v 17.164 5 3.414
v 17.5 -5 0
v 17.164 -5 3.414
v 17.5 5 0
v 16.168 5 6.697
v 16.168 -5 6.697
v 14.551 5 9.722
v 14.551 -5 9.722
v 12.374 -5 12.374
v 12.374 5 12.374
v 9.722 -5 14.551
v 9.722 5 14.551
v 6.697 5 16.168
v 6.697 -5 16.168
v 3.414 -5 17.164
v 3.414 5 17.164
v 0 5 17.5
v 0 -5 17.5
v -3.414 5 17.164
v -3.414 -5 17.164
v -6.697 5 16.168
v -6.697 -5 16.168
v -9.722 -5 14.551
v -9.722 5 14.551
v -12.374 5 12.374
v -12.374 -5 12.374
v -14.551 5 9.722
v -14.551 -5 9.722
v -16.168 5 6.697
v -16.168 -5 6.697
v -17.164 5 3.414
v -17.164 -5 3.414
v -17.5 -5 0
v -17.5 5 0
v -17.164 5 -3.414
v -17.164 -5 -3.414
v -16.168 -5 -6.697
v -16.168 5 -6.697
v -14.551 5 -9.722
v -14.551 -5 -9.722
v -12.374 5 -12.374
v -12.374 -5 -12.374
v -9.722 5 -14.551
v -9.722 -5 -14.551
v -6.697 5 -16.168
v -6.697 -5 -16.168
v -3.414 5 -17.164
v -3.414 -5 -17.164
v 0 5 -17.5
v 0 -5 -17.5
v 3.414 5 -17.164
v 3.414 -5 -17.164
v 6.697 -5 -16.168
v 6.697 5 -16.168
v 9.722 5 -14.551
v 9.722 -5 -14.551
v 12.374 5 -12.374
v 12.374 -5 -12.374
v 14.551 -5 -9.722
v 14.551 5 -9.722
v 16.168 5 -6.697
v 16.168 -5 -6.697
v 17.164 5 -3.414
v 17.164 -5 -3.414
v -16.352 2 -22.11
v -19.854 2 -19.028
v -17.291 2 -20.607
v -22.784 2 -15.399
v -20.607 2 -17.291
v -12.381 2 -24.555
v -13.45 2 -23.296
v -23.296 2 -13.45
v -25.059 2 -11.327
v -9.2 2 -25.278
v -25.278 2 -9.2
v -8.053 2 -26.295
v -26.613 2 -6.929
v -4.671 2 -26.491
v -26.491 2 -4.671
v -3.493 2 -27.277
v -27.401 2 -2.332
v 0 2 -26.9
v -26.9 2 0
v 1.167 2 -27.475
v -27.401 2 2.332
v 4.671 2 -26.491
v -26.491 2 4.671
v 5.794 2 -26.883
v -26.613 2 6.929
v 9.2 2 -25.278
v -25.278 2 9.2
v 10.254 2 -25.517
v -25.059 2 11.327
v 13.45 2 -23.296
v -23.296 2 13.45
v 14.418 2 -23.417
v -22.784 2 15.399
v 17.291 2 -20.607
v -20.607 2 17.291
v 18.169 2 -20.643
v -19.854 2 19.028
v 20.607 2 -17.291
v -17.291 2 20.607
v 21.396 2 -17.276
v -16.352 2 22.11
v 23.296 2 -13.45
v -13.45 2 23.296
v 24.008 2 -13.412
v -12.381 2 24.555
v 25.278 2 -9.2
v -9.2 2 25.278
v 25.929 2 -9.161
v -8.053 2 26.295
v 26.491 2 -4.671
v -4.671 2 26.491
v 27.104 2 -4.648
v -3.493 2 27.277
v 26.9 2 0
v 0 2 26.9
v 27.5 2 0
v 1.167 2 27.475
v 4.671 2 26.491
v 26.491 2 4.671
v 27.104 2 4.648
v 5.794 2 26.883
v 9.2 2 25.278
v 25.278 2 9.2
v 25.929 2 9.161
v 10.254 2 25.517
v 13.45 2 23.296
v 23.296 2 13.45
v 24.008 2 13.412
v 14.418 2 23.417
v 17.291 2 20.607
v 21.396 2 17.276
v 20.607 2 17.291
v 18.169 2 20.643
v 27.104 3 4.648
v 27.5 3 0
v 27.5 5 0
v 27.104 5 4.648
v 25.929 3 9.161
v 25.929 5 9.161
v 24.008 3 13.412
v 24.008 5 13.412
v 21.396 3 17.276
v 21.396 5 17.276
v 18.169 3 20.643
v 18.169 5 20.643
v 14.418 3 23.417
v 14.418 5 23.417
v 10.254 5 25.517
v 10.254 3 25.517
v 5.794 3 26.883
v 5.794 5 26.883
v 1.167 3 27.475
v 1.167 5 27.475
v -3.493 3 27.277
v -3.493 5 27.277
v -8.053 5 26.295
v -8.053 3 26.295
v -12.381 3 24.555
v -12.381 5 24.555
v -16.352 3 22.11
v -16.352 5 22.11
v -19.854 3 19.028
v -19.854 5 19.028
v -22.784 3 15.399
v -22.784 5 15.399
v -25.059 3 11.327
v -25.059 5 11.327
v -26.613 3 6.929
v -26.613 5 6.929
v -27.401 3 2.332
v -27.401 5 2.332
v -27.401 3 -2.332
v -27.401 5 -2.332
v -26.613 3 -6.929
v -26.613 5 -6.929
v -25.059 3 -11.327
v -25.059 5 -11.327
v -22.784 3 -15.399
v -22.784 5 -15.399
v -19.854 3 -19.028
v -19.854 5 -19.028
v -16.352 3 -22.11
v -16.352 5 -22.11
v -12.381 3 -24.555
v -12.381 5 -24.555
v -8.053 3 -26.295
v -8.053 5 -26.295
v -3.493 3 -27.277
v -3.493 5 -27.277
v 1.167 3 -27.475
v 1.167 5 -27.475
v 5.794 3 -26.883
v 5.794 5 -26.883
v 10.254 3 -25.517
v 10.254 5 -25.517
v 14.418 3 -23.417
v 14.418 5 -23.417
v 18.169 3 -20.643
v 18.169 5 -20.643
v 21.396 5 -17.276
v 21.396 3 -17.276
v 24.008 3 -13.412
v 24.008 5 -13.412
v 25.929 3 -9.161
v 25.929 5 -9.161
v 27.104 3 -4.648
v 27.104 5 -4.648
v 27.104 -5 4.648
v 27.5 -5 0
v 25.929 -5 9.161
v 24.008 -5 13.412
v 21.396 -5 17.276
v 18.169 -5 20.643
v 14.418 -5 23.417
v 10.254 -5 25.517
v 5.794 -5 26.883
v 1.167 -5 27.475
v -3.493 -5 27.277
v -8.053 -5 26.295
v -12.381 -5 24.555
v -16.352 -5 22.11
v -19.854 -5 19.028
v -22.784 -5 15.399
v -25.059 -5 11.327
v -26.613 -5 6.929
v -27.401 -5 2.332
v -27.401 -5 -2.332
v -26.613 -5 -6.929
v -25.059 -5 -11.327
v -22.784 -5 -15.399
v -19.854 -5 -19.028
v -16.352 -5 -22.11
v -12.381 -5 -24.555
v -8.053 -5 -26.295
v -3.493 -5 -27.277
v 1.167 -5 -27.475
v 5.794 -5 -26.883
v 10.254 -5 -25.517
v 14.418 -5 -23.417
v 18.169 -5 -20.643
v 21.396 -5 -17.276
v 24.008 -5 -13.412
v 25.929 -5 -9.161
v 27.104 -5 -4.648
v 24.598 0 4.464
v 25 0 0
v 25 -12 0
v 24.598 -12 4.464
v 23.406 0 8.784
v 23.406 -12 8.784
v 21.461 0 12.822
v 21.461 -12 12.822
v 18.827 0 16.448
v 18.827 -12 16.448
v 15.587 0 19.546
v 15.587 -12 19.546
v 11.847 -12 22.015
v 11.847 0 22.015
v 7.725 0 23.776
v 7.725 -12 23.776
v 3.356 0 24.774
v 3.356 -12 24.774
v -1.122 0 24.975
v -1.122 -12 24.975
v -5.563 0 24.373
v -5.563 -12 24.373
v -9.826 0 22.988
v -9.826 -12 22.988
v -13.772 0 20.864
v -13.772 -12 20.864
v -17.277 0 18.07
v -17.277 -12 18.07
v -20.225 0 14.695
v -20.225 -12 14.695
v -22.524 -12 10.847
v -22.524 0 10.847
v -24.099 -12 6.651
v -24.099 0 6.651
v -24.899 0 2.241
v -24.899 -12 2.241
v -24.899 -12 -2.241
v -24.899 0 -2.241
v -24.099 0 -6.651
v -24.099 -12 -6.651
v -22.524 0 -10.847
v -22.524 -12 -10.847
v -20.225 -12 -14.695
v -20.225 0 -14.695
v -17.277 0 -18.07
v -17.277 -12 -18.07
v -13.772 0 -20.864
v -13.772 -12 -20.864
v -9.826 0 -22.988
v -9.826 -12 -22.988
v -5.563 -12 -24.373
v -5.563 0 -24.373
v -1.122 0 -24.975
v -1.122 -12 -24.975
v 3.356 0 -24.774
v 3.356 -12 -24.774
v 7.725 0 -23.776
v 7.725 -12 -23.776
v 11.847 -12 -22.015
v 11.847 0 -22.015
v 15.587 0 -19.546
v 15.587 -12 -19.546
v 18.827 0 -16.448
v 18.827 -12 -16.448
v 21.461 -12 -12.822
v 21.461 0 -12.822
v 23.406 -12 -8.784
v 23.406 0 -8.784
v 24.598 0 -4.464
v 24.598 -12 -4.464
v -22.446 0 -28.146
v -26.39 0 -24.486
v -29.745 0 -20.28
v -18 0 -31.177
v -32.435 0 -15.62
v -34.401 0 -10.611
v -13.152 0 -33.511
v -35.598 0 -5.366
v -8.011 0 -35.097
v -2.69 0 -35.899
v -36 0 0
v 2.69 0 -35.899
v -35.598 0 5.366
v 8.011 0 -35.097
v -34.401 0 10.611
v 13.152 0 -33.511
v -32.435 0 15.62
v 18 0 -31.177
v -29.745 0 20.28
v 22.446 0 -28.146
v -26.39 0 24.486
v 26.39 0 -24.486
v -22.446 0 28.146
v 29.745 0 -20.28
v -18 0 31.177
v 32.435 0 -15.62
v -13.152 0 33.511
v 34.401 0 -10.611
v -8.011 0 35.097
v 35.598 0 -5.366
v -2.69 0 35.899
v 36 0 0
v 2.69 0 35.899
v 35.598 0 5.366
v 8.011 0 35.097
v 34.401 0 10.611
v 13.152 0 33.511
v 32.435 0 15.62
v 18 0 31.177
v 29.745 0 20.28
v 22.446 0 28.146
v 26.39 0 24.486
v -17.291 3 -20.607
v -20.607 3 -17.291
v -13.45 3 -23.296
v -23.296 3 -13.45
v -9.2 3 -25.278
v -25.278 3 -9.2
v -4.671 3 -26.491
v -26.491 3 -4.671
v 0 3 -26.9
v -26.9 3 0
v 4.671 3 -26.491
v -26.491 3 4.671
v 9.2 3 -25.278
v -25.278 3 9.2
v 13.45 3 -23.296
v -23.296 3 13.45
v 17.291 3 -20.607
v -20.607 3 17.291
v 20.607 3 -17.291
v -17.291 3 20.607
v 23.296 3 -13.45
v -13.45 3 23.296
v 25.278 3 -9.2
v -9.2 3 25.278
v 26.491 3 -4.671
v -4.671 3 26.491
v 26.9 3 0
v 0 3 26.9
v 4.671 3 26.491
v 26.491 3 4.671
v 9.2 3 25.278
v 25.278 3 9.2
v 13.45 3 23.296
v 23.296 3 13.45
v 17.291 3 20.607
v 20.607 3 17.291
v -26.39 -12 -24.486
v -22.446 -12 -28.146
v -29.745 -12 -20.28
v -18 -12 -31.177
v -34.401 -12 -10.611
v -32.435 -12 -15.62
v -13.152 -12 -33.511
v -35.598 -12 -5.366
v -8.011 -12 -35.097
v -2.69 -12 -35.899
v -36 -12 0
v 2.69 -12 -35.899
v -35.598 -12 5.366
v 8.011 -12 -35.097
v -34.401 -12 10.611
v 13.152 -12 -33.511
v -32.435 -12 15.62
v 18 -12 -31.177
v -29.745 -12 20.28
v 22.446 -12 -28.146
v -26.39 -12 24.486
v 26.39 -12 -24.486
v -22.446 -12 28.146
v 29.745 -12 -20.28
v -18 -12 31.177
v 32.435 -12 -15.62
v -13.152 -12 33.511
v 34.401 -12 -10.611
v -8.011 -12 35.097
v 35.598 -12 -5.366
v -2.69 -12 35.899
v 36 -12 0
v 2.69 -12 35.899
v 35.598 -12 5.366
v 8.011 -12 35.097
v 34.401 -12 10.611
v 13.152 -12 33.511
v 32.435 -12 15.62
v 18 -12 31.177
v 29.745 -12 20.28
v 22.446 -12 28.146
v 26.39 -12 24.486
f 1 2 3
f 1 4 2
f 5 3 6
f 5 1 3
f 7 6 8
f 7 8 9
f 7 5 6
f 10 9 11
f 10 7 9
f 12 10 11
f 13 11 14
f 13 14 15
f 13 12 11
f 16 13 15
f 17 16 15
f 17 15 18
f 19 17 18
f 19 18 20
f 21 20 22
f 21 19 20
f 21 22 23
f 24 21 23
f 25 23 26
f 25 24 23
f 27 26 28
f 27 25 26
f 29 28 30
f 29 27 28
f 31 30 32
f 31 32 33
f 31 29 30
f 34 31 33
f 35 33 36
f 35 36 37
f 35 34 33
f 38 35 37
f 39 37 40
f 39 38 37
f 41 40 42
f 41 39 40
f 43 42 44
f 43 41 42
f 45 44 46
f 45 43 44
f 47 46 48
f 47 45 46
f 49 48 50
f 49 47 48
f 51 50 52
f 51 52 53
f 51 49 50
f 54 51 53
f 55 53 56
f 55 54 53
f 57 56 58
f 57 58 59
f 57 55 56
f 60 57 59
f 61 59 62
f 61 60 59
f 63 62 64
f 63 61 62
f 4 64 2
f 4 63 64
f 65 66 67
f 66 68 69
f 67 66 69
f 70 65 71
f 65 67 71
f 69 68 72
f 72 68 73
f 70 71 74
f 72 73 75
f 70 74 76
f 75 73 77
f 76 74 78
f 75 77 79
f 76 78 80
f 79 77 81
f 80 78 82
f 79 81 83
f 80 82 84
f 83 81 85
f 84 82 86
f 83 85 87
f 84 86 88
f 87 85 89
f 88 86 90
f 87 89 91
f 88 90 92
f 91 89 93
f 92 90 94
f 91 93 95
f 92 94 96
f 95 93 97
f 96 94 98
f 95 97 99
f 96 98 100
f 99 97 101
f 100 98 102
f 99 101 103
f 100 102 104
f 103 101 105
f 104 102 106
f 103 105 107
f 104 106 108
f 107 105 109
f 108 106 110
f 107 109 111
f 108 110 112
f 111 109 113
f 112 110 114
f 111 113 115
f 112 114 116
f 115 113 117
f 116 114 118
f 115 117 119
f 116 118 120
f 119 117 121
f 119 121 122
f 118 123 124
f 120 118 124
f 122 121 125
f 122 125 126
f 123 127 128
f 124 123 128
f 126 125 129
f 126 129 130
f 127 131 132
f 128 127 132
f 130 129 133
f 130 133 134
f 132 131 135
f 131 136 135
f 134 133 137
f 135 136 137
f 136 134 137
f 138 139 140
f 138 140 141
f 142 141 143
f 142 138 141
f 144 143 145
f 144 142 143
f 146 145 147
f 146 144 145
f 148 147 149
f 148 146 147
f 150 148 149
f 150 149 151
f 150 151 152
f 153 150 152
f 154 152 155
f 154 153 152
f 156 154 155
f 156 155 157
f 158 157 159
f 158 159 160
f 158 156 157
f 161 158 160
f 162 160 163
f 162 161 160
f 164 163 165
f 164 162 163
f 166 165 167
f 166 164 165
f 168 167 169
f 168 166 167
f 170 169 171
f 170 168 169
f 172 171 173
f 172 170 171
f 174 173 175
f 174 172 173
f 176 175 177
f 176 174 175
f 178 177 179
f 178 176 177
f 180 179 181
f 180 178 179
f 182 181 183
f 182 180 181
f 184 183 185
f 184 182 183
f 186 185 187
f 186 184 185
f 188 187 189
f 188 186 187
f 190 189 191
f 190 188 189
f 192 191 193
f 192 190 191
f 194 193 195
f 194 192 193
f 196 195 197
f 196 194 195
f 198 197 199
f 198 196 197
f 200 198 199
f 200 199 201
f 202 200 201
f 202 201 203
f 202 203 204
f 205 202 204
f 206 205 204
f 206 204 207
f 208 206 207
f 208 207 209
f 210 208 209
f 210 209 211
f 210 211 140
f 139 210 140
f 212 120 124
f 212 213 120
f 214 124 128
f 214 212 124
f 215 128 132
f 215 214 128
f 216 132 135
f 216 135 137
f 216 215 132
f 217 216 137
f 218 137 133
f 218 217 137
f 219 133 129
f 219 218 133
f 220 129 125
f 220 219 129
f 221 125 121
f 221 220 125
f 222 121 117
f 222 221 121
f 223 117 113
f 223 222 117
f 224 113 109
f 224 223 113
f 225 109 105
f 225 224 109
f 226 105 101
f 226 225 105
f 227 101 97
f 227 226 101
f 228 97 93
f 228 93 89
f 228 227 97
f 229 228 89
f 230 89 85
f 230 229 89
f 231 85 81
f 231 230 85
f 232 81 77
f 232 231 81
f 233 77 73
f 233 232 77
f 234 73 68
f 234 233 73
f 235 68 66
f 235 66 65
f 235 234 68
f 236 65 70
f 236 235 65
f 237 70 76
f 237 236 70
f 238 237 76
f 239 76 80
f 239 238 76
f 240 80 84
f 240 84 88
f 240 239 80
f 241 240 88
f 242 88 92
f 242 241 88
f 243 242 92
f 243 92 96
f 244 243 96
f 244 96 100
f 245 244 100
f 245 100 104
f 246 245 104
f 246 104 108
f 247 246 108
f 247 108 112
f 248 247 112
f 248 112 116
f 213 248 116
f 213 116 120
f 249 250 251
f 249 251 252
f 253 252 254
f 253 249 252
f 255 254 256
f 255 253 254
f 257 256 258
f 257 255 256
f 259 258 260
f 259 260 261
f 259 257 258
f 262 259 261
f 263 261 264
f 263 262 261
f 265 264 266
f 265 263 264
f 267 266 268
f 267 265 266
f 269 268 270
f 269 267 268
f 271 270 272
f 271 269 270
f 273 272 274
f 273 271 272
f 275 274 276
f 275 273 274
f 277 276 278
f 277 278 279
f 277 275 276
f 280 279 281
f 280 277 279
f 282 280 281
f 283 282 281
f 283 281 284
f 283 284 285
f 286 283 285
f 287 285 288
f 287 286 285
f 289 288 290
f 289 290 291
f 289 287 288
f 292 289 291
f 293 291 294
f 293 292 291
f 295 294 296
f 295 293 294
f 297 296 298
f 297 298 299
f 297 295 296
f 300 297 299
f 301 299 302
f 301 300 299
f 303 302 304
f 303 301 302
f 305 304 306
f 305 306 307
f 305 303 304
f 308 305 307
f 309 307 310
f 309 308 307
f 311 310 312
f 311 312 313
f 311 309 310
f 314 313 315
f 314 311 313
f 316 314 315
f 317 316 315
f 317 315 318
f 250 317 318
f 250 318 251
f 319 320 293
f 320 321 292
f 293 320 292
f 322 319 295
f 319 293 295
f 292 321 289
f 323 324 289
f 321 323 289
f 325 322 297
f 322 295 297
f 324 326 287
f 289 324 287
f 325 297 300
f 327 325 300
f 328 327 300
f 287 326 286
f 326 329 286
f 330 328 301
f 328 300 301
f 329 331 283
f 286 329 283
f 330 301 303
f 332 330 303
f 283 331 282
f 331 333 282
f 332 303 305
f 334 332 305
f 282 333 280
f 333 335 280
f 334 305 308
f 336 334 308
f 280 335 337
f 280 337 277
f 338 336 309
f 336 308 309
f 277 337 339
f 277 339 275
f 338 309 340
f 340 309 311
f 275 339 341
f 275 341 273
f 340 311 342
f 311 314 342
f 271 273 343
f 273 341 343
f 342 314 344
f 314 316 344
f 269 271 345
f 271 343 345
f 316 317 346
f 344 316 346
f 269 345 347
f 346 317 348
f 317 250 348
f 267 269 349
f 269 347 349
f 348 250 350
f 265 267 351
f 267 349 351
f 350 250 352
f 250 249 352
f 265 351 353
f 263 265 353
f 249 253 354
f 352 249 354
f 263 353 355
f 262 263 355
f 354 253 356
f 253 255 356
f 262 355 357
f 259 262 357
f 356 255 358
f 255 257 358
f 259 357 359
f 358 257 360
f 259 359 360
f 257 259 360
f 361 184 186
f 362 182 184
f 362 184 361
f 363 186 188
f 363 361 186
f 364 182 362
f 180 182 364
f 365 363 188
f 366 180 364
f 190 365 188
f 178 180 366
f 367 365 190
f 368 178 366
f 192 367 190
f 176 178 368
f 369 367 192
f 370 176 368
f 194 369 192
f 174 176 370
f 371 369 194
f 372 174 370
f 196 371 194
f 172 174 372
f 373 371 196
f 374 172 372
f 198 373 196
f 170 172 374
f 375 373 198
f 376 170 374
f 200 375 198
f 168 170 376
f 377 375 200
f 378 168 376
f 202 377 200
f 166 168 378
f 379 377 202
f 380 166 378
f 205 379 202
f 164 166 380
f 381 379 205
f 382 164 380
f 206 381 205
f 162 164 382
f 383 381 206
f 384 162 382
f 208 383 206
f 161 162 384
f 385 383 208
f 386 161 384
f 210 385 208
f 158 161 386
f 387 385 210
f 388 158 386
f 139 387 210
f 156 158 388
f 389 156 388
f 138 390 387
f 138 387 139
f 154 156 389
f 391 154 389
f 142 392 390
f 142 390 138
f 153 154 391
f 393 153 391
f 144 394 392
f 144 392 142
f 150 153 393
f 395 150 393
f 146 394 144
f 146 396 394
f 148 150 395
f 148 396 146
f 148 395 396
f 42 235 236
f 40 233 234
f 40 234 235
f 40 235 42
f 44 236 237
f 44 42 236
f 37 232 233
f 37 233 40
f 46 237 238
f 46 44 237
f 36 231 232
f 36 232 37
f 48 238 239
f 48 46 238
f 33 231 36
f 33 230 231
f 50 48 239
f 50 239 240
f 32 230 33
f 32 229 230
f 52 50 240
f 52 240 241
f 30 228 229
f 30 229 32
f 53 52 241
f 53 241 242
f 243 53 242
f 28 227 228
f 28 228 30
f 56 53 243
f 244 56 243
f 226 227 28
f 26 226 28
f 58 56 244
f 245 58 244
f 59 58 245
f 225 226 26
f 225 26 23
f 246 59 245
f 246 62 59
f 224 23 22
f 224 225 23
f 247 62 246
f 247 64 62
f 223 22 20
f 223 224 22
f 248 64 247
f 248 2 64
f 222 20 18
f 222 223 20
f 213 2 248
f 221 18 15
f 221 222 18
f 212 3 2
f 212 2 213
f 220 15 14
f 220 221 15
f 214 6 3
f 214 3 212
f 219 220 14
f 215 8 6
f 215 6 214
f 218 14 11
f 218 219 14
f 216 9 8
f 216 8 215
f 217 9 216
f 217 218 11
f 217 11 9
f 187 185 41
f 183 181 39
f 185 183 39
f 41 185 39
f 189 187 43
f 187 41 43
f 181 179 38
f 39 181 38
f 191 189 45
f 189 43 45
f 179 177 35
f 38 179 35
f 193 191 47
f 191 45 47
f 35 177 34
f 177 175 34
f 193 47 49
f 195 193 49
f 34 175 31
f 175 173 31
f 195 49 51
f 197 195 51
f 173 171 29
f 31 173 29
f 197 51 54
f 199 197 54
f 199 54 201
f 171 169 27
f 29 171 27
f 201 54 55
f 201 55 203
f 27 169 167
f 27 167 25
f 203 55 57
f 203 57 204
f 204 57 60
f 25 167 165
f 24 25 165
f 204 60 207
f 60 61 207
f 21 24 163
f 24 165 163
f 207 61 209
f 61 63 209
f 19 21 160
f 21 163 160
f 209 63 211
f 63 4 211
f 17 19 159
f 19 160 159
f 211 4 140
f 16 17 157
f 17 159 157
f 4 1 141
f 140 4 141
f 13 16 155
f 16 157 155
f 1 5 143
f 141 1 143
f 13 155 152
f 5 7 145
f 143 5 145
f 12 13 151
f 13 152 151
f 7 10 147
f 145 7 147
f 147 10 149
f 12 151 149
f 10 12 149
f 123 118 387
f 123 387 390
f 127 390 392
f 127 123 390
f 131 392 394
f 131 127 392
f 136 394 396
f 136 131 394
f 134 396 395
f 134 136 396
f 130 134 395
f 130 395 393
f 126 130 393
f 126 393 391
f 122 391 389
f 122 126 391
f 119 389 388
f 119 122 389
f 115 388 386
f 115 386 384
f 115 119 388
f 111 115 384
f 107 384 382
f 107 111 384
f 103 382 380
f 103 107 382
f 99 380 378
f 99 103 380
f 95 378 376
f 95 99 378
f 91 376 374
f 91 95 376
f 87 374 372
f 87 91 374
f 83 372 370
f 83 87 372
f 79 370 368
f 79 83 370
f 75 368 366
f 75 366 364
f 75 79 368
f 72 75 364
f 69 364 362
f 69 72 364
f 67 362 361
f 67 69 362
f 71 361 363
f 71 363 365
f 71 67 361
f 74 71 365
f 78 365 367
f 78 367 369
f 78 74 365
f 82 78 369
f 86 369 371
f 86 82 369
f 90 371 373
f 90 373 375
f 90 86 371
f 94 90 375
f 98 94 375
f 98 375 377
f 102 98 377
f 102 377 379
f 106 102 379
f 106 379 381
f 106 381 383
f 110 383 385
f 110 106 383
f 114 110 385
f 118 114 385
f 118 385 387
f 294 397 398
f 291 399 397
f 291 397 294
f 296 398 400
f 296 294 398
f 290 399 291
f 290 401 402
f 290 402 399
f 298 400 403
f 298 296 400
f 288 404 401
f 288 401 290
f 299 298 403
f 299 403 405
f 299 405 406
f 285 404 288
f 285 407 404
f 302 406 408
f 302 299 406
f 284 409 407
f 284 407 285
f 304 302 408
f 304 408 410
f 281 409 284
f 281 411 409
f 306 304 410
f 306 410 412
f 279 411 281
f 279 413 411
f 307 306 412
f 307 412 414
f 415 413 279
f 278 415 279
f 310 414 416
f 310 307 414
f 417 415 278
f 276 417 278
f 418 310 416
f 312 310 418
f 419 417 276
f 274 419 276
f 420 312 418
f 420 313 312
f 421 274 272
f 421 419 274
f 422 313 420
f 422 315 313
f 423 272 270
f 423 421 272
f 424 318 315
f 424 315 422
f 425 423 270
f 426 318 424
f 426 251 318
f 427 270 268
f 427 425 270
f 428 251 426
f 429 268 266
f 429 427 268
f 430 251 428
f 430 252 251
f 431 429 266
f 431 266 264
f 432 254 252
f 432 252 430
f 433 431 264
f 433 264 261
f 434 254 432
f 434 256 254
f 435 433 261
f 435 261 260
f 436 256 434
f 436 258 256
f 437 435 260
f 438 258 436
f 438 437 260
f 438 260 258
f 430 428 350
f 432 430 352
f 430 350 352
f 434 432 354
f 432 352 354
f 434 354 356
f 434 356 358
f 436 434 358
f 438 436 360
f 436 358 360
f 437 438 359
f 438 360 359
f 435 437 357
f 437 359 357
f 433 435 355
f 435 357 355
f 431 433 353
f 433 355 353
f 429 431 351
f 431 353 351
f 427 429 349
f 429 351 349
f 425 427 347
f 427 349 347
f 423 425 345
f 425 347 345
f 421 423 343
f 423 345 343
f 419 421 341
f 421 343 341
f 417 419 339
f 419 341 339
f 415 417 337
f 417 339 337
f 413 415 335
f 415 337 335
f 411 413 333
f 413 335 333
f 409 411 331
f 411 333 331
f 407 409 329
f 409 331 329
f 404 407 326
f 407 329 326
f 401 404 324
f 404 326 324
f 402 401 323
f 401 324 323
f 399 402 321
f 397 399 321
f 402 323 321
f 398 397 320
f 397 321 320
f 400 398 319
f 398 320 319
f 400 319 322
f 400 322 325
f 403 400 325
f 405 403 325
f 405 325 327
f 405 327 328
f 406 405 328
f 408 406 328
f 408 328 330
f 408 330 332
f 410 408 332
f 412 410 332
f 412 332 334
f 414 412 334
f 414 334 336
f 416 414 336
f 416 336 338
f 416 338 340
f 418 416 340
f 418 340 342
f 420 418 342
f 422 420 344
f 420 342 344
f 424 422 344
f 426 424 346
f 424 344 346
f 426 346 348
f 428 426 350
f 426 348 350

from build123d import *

# Parameters (mm, degrees)
F0_R     = 27.5
F0_R_2   = 17.5
F1_DEPTH = 5
F3_R     = 27.5
F3_R_2   = 26.9
F4_DEPTH = 1
F5_R     = 36
F5_R_2   = 25
F6_DEPTH = 12


with BuildPart() as f1:
    # F0 (on Front) → F1 (new body, symmetric)
    with BuildSketch(Plane.XZ):
        Circle(F0_R)
        Circle(F0_R_2, mode=Mode.SUBTRACT)
    extrude(amount=F1_DEPTH, both=True)

    # F3 (on offset) → F4 (cut)
    with BuildSketch(Plane.XZ.offset(-2)):
        Circle(F3_R)
        Circle(F3_R_2, mode=Mode.SUBTRACT)
    extrude(amount=-F4_DEPTH, mode=Mode.SUBTRACT)


with BuildPart() as f6:
    # F5 (on Front) → F6 (new body)
    with BuildSketch(Plane.XZ):
        Circle(F5_R)
        Circle(F5_R_2, mode=Mode.SUBTRACT)
    extrude(amount=F6_DEPTH)


solid = Compound([f1.part, f6.part])
